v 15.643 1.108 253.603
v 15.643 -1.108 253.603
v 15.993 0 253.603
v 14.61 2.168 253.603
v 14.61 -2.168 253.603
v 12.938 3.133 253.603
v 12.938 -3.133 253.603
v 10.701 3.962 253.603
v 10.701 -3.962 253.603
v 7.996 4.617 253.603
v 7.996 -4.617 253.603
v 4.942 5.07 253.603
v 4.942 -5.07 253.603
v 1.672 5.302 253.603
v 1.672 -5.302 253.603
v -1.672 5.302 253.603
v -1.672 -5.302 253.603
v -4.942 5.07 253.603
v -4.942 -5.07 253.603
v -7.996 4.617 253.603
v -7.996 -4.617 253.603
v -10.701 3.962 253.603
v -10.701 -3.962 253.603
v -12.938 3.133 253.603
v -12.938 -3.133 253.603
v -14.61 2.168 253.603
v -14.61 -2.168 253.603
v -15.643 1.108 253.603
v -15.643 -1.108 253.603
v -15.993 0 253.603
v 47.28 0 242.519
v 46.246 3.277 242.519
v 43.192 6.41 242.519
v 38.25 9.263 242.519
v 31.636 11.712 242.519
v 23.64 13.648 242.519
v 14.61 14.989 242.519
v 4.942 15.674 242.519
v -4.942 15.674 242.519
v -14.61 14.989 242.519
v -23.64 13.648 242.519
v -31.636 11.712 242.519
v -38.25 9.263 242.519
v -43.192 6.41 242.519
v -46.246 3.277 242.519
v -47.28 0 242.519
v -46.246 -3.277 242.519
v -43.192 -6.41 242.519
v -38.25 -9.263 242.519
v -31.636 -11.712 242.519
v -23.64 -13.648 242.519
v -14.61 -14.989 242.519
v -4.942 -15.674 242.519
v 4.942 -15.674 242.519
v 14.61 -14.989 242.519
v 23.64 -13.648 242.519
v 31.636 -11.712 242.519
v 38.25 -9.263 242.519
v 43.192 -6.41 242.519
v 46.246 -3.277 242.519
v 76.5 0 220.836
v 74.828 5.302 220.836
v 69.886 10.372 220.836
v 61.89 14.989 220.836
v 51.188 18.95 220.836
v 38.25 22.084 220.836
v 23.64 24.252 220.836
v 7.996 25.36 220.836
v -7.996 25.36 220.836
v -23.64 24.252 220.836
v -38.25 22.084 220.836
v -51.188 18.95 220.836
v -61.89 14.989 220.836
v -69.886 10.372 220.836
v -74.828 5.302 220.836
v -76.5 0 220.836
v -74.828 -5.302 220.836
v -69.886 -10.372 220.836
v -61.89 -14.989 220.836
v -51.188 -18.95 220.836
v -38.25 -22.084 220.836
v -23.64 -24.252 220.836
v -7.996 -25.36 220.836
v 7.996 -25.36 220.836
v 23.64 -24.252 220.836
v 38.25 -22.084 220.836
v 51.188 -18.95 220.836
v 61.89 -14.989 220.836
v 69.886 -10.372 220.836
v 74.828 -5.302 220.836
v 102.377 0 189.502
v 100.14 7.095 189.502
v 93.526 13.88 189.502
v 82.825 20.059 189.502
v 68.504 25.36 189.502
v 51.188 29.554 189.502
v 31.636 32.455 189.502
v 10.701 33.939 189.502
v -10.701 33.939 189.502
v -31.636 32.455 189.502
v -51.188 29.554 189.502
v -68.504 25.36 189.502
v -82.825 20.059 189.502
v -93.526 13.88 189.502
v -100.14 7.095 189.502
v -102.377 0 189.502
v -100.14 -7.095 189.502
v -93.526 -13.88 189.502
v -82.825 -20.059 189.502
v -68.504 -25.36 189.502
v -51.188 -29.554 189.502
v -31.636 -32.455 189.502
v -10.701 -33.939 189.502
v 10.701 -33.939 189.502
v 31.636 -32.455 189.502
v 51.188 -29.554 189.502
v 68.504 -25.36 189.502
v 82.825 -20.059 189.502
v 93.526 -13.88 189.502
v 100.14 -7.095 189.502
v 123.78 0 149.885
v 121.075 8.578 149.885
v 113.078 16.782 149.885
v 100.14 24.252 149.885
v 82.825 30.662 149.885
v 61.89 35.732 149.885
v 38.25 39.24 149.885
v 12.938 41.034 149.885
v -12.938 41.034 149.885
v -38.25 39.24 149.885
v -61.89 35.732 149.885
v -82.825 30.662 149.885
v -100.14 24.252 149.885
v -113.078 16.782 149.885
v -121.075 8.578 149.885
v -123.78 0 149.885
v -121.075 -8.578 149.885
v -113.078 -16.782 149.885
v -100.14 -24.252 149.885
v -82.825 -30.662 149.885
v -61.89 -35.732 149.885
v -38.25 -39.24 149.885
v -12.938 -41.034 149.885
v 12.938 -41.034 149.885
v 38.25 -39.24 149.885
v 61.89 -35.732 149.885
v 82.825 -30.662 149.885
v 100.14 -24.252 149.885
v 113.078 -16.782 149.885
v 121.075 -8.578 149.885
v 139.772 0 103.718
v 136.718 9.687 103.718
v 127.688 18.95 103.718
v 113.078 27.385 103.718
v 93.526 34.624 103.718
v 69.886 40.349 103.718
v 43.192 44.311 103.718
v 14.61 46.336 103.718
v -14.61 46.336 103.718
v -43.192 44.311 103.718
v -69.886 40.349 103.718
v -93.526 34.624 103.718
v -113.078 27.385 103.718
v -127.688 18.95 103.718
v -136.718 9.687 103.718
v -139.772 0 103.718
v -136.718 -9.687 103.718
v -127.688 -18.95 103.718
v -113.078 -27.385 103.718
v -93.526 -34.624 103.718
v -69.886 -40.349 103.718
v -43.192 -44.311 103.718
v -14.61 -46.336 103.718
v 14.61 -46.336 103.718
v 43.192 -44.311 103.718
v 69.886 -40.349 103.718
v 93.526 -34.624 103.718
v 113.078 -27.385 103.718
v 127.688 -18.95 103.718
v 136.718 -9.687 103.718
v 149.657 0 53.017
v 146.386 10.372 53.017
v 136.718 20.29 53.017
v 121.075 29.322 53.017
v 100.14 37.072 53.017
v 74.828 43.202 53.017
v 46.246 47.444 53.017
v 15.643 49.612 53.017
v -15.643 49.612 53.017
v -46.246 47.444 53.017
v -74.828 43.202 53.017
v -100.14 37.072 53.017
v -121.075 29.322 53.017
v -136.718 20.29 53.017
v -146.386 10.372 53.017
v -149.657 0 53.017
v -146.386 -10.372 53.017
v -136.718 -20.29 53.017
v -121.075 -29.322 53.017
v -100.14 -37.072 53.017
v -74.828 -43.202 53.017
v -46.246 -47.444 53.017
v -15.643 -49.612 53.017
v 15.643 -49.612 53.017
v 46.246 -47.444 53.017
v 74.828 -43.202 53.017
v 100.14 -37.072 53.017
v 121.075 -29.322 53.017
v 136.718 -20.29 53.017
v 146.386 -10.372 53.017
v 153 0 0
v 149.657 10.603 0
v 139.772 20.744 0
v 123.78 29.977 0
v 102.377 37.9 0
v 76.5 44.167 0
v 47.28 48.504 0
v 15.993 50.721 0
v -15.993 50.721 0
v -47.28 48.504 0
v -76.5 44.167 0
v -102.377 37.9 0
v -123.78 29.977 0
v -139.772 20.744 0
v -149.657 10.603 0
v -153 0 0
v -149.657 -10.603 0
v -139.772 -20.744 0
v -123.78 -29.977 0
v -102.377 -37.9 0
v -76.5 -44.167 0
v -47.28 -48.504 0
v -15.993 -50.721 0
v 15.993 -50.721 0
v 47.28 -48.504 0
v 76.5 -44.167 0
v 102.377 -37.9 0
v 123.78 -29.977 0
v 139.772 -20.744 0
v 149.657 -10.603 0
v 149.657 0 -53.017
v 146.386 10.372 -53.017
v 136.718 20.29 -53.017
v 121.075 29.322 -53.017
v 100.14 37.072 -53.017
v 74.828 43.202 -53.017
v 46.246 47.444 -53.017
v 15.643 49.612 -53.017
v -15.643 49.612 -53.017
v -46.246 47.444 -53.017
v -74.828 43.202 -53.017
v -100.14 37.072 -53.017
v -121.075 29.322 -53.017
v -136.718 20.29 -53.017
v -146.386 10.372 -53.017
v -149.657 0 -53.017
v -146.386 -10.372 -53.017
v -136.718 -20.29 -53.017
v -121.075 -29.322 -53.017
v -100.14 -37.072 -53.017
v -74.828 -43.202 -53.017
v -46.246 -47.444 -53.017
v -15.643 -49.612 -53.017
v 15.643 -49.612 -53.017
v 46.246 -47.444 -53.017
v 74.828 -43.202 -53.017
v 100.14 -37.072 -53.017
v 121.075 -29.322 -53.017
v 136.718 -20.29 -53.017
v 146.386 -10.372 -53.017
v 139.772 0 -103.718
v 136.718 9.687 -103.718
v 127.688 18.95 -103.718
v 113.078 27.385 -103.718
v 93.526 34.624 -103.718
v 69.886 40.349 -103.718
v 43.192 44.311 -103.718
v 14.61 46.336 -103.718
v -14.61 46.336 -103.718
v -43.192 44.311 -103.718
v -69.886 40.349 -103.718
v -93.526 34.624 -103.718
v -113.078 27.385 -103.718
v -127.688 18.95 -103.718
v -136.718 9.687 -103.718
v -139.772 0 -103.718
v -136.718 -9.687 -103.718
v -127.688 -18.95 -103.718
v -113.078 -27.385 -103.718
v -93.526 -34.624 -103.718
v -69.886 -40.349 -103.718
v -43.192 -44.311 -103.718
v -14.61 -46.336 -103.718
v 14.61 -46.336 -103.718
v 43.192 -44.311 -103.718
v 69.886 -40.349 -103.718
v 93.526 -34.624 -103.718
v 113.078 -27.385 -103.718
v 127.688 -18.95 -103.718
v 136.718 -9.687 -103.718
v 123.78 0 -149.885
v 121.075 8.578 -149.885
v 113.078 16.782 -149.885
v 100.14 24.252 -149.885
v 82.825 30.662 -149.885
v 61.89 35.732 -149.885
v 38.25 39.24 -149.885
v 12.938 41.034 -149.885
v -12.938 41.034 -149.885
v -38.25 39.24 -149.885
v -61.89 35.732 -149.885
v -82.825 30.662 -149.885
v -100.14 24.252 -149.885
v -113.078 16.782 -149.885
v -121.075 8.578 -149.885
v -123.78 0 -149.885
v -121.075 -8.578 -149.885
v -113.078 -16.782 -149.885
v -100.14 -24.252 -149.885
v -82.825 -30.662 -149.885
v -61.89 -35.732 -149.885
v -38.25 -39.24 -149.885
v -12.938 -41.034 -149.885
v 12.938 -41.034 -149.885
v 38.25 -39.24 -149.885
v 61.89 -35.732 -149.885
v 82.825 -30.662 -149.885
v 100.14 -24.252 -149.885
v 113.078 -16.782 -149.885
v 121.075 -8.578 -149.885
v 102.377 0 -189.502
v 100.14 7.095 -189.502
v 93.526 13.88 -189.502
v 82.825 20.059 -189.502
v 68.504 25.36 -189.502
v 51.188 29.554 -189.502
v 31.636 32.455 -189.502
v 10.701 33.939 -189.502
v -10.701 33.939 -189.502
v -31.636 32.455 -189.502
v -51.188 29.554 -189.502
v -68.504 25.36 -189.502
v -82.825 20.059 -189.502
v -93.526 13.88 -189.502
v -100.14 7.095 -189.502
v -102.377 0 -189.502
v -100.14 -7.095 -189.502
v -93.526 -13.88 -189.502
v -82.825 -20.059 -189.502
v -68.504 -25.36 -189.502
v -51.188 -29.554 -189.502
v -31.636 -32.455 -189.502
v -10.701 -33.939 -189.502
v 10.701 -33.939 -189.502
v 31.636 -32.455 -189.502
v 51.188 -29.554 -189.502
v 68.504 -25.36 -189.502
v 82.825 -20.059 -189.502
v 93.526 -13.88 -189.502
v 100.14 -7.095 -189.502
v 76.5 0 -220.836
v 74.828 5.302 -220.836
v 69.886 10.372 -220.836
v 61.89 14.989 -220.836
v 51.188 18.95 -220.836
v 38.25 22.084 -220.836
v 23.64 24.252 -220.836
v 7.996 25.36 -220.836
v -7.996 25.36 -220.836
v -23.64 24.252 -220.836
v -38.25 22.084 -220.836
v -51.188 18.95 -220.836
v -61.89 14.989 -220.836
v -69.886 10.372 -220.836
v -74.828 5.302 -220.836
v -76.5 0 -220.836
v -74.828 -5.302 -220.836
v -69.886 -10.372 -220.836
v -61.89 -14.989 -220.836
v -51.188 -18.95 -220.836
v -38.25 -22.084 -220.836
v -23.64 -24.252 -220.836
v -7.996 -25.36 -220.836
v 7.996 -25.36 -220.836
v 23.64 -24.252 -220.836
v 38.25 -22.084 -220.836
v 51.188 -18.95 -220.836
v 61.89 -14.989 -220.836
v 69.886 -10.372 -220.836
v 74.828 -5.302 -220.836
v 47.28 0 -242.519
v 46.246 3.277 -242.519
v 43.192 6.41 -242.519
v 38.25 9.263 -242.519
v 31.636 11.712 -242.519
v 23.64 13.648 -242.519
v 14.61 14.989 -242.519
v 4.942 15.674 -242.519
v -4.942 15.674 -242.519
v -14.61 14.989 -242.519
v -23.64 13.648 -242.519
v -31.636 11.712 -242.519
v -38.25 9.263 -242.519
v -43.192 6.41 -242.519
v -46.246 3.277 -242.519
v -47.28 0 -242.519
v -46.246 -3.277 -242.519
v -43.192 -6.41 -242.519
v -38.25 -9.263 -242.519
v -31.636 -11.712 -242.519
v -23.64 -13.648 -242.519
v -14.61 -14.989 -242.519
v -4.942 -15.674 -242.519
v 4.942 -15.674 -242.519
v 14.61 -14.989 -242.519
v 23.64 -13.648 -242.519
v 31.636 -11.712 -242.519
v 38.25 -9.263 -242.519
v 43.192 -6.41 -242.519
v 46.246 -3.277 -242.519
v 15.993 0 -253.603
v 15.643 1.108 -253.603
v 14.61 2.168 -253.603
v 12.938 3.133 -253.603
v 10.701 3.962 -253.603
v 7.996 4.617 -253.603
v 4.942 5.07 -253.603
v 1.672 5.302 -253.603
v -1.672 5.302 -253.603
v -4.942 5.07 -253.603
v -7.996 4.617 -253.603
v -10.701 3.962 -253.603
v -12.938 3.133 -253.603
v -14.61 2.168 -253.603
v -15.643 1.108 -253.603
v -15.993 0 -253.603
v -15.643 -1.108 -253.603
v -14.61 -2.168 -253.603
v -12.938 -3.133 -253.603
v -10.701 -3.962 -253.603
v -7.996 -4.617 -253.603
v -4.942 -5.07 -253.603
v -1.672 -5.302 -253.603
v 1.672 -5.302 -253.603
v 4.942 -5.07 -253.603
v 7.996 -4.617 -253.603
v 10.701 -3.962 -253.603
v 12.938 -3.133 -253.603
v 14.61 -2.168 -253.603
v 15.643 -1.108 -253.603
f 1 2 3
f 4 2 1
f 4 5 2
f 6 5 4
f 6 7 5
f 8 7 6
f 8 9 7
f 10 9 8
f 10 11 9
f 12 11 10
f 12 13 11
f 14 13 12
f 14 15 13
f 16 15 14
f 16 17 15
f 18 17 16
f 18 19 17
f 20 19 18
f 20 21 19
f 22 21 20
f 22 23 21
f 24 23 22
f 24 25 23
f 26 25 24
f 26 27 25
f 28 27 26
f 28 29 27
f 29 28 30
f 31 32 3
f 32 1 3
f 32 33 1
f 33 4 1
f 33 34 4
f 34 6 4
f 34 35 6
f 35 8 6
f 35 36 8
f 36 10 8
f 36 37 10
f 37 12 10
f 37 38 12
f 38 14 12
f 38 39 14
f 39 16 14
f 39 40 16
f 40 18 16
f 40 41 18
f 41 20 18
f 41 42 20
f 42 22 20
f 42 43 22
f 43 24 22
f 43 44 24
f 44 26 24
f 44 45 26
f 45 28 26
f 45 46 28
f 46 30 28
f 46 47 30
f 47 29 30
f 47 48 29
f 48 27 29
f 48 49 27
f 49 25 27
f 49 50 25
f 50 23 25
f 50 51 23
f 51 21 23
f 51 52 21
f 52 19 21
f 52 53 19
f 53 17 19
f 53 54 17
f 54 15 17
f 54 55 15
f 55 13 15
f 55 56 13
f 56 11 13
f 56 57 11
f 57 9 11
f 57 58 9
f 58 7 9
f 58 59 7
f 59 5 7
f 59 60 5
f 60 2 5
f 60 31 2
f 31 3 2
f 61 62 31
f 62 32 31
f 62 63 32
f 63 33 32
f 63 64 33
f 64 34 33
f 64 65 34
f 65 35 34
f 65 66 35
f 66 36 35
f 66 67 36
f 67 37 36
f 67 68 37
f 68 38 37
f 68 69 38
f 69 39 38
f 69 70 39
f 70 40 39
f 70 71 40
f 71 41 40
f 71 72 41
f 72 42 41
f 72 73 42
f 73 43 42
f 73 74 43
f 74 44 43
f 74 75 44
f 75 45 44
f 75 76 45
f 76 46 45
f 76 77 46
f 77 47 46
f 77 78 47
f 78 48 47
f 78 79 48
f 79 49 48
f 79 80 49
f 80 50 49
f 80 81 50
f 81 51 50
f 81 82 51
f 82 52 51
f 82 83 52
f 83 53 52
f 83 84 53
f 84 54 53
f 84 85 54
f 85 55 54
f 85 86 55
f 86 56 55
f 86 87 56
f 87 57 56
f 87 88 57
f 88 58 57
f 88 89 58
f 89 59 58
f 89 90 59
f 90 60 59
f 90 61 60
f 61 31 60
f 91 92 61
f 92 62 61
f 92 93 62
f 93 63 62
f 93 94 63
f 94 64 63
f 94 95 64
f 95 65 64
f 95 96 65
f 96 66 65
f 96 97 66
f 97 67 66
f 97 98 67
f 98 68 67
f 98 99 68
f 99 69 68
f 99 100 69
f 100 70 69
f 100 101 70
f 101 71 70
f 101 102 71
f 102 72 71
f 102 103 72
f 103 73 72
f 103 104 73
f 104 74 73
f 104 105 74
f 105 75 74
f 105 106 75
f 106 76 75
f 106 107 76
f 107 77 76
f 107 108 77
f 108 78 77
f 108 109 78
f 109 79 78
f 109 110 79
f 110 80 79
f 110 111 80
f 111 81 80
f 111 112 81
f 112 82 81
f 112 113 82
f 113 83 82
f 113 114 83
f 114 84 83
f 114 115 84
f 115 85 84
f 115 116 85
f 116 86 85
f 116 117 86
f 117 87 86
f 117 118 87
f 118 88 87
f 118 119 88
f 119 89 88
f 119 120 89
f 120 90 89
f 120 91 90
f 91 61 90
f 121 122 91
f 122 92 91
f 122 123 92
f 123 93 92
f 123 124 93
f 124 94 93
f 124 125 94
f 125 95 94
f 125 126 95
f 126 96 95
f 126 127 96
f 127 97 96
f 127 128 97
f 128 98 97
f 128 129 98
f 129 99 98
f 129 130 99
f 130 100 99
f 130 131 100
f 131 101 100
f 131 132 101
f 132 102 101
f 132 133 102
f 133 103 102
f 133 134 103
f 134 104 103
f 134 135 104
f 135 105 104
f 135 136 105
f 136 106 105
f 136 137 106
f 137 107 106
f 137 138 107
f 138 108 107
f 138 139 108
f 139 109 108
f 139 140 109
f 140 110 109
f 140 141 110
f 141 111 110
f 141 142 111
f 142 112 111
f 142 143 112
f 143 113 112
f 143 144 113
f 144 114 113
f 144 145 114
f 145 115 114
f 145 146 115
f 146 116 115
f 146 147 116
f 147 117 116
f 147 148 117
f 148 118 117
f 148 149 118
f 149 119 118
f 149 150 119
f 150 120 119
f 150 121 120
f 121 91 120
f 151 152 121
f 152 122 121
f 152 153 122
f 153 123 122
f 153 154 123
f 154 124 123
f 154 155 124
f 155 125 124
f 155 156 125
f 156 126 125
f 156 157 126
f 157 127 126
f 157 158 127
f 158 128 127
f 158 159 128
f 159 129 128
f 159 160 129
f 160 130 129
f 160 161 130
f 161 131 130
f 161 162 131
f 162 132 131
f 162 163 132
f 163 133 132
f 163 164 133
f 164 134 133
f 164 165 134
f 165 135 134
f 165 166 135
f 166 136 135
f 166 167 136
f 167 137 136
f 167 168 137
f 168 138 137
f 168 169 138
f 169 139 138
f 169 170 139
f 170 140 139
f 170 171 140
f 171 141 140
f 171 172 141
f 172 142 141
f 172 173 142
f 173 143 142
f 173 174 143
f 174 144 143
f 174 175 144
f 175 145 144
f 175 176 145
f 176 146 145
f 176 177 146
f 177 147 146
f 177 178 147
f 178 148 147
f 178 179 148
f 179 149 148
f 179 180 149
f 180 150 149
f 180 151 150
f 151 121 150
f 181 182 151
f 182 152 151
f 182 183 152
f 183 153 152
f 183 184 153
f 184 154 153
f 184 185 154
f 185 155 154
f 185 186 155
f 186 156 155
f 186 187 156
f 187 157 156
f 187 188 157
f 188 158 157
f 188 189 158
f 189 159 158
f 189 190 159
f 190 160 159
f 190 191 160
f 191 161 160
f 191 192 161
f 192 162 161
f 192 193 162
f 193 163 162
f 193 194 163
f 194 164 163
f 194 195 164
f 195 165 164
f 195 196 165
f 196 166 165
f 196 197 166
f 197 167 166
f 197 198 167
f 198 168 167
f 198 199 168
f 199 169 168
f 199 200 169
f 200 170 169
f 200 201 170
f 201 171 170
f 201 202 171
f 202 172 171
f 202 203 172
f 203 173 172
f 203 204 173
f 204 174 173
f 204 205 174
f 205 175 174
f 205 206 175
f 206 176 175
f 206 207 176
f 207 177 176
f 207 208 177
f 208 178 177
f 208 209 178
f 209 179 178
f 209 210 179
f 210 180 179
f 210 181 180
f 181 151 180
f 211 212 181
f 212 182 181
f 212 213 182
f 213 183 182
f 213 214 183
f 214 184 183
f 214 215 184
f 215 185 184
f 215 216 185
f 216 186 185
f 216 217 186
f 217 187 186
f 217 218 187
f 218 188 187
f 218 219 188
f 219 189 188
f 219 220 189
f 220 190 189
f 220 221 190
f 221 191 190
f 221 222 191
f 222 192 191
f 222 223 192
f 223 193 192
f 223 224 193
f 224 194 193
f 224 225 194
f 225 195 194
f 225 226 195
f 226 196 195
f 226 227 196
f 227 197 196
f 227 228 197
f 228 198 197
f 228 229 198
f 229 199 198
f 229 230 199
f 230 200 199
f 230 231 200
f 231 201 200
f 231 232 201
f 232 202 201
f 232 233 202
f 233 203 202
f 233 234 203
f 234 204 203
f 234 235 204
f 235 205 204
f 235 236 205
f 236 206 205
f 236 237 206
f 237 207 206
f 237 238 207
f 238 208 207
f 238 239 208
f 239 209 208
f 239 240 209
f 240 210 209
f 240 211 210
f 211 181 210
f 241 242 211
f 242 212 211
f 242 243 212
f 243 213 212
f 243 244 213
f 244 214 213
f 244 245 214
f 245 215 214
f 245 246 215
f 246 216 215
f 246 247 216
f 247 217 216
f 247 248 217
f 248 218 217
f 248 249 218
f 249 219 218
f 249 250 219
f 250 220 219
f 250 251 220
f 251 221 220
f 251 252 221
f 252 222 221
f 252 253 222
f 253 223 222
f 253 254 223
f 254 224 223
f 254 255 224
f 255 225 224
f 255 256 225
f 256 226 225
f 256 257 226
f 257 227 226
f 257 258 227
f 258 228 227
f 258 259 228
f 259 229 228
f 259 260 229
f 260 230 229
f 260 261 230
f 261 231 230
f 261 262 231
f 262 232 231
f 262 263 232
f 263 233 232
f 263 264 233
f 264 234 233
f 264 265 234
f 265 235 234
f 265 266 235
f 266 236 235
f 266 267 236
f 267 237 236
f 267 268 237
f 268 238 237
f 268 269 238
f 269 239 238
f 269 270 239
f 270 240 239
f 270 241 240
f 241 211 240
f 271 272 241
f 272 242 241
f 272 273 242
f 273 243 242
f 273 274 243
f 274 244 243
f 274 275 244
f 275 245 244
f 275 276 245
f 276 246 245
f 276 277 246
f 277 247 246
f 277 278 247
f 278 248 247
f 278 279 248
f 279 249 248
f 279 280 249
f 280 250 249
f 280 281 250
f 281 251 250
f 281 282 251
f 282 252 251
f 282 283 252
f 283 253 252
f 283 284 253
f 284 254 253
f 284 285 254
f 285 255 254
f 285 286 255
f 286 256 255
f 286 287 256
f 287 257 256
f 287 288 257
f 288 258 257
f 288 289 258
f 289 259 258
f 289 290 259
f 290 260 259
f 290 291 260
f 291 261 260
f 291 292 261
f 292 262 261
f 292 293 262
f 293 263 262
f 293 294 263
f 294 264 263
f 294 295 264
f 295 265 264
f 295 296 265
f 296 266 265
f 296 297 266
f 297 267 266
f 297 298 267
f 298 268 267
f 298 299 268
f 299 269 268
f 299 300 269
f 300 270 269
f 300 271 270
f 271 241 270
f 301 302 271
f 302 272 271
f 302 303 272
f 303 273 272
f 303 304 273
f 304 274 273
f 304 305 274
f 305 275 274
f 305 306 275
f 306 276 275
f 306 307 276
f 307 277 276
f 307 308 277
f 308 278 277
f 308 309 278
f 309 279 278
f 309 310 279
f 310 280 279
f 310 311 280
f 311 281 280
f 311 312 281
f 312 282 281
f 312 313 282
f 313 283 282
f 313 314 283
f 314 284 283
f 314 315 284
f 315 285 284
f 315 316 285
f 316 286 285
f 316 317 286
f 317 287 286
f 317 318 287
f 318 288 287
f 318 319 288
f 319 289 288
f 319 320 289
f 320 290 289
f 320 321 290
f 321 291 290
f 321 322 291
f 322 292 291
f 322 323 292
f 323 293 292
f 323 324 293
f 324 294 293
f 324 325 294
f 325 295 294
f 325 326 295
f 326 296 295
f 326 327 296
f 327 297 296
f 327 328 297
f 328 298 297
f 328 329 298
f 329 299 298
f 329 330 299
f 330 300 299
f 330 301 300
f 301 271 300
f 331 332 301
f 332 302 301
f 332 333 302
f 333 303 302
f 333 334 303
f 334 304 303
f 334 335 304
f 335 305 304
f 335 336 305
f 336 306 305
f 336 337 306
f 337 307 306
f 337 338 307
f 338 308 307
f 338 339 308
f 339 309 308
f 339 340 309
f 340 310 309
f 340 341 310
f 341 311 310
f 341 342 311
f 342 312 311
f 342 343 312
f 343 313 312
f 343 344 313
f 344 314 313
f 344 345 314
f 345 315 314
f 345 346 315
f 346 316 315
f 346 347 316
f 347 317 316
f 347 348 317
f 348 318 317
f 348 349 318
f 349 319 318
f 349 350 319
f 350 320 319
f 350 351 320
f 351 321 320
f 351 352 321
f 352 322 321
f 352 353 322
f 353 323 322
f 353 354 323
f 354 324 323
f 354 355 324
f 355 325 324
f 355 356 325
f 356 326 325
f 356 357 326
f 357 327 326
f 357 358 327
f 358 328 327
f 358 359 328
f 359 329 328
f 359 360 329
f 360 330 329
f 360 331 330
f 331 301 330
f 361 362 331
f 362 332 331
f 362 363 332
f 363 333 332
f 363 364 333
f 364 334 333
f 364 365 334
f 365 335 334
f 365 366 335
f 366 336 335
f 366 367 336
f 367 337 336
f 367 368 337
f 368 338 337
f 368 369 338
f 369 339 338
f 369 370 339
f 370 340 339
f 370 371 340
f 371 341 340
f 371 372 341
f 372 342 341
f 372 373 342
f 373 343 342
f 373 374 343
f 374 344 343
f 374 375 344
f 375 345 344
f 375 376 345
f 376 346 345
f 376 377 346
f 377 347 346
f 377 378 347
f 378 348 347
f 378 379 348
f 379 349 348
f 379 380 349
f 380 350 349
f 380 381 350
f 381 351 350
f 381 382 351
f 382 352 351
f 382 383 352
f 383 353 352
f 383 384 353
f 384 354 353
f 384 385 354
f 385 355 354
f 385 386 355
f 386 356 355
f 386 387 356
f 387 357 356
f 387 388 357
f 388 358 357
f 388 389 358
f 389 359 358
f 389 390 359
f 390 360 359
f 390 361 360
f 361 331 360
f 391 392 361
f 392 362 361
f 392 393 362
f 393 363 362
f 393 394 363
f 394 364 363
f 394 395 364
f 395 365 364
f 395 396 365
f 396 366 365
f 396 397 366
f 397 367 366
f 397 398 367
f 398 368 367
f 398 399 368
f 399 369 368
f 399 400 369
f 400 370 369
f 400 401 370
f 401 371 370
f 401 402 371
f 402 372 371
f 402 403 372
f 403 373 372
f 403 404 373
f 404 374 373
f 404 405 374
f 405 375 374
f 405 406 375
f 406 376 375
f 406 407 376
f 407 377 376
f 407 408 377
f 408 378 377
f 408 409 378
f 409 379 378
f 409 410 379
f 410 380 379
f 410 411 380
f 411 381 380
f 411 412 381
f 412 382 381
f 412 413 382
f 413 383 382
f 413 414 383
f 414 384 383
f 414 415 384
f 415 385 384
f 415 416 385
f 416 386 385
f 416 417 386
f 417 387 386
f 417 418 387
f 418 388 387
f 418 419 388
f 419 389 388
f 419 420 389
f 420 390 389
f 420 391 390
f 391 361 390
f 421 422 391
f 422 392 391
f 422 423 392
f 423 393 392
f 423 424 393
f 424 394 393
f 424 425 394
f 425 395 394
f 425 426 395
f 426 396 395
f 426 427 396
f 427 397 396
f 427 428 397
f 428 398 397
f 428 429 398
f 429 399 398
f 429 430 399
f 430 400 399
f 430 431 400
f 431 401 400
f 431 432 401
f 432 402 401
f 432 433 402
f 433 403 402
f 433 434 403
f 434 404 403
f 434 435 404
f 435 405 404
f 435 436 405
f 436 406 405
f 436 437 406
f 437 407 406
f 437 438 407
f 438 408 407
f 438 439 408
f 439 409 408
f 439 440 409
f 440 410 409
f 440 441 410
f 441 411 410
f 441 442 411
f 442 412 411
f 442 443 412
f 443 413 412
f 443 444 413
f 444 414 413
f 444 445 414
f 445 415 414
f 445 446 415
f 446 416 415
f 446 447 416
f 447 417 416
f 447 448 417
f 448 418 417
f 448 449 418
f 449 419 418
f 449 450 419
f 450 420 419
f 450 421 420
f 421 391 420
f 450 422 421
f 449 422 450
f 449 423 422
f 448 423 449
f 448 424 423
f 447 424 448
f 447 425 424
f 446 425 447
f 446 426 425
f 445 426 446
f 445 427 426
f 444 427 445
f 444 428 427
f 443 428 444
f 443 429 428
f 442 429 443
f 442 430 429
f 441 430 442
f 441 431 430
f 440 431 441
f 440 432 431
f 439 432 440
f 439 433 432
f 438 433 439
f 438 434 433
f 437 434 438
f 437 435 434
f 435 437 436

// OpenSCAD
// Generated by SolidPython 1.0.1 on 2020-07-29 00:46:48


scale(v = [9, 3, 15]) {
	sphere(r = 17);
}
/***********************************************
*********      SolidPython code:      **********
************************************************
 
# import packages: SolidPython
from solid import *
from solid.utils import *
from itertools import chain, combinations, permutations


class Resize:

    def __init__(self, scad_file):
        self.scad_file = scad_file
        #self.scad_file = import_scad(scad_file)
        # cone/cylinder param:
        self.r1 = 0
        self.r2 = 0
        self.h = 0
        # rectangular prism param:
        self.w = 0
        self.l = 0
        # ellipse param:
        self.r = 0

    # import OpenScad code (file name corresponds to shape)


    # classify shape + parameters
    def assign(self, param1, param2, param3):
        if self.scad_file == 'cone.scad':
            self.r1 = param1
            self.r2 = param2
            self.h = param3
        elif self.scad_file == 'cylinder.scad':
            self.r1 = param1
            self.r2 = param2
            self.h = param3
        elif self.scad_file == 'rectangularPrism.scad':
            self.h = param1
            self.l = param2
            self.w = param3
        else:
            self.r = param1
            self.h = param2

    # resize parameters
    def iterate(self):
        x = range(3, 20, 2)
        i = 1
        if self.scad_file == 'cone.scad':
            tempList = list(permutations(x, 2))
            for temp in tempList:
                param1 = temp[0]
                param2 = temp[1]
                filepath = 'produced_scad_files/' + 'cone' + str(param1) + '_' + str(param2) + '_' + '.scad'
                scad_render_to_file(cylinder(h=param1, r1=param2, r2=0), filepath)

        elif self.scad_file == 'cylinder.scad':
            tempList = list(permutations(x, 3))
            for temp in tempList:
                param1 = temp[0]
                param2 = temp[1]
                filepath = 'produced_scad_files/' + 'cylinder' + str(param1) + '_' + str(param2) + '_' + '.scad'
                scad_render_to_file(cylinder(h=param1, r1=param2, r2=param2), filepath)

        elif self.scad_file == 'rectangularPrism.scad':
            tempList = list(permutations(x, 3))
            for temp in tempList:
                param1 = temp[0]
                param2 = temp[1]
                param3 = temp[2]
                filepath = 'produced_scad_files/' + 'rectangularPrism' + str(param1) + '_' + str(param2) + '_' + str(
                    param3) + '.scad'
                scad_render_to_file(cube(size=(param1, param2, param3)), filepath)

        elif self.scad_file == 'ellipse.scad':
            tempList = list(permutations(x, 4))
            for temp in tempList:
                param1 = temp[0]
                param2 = temp[1]
                param3 = temp[2]
                param4 = temp[3]
                filepath = 'produced_scad_files/' + 'ellipse' + str(param1) + '_' + str(param2) + '_' + str(param3) + '_' + str(param4) + '.scad'
                scad_render_to_file(scale([param1, param2, param3])(sphere(r=param4)), filepath)

    def render_to_scadfile(self):
        scad_render_to_file(scad, 'example.scad') 
 
************************************************/
